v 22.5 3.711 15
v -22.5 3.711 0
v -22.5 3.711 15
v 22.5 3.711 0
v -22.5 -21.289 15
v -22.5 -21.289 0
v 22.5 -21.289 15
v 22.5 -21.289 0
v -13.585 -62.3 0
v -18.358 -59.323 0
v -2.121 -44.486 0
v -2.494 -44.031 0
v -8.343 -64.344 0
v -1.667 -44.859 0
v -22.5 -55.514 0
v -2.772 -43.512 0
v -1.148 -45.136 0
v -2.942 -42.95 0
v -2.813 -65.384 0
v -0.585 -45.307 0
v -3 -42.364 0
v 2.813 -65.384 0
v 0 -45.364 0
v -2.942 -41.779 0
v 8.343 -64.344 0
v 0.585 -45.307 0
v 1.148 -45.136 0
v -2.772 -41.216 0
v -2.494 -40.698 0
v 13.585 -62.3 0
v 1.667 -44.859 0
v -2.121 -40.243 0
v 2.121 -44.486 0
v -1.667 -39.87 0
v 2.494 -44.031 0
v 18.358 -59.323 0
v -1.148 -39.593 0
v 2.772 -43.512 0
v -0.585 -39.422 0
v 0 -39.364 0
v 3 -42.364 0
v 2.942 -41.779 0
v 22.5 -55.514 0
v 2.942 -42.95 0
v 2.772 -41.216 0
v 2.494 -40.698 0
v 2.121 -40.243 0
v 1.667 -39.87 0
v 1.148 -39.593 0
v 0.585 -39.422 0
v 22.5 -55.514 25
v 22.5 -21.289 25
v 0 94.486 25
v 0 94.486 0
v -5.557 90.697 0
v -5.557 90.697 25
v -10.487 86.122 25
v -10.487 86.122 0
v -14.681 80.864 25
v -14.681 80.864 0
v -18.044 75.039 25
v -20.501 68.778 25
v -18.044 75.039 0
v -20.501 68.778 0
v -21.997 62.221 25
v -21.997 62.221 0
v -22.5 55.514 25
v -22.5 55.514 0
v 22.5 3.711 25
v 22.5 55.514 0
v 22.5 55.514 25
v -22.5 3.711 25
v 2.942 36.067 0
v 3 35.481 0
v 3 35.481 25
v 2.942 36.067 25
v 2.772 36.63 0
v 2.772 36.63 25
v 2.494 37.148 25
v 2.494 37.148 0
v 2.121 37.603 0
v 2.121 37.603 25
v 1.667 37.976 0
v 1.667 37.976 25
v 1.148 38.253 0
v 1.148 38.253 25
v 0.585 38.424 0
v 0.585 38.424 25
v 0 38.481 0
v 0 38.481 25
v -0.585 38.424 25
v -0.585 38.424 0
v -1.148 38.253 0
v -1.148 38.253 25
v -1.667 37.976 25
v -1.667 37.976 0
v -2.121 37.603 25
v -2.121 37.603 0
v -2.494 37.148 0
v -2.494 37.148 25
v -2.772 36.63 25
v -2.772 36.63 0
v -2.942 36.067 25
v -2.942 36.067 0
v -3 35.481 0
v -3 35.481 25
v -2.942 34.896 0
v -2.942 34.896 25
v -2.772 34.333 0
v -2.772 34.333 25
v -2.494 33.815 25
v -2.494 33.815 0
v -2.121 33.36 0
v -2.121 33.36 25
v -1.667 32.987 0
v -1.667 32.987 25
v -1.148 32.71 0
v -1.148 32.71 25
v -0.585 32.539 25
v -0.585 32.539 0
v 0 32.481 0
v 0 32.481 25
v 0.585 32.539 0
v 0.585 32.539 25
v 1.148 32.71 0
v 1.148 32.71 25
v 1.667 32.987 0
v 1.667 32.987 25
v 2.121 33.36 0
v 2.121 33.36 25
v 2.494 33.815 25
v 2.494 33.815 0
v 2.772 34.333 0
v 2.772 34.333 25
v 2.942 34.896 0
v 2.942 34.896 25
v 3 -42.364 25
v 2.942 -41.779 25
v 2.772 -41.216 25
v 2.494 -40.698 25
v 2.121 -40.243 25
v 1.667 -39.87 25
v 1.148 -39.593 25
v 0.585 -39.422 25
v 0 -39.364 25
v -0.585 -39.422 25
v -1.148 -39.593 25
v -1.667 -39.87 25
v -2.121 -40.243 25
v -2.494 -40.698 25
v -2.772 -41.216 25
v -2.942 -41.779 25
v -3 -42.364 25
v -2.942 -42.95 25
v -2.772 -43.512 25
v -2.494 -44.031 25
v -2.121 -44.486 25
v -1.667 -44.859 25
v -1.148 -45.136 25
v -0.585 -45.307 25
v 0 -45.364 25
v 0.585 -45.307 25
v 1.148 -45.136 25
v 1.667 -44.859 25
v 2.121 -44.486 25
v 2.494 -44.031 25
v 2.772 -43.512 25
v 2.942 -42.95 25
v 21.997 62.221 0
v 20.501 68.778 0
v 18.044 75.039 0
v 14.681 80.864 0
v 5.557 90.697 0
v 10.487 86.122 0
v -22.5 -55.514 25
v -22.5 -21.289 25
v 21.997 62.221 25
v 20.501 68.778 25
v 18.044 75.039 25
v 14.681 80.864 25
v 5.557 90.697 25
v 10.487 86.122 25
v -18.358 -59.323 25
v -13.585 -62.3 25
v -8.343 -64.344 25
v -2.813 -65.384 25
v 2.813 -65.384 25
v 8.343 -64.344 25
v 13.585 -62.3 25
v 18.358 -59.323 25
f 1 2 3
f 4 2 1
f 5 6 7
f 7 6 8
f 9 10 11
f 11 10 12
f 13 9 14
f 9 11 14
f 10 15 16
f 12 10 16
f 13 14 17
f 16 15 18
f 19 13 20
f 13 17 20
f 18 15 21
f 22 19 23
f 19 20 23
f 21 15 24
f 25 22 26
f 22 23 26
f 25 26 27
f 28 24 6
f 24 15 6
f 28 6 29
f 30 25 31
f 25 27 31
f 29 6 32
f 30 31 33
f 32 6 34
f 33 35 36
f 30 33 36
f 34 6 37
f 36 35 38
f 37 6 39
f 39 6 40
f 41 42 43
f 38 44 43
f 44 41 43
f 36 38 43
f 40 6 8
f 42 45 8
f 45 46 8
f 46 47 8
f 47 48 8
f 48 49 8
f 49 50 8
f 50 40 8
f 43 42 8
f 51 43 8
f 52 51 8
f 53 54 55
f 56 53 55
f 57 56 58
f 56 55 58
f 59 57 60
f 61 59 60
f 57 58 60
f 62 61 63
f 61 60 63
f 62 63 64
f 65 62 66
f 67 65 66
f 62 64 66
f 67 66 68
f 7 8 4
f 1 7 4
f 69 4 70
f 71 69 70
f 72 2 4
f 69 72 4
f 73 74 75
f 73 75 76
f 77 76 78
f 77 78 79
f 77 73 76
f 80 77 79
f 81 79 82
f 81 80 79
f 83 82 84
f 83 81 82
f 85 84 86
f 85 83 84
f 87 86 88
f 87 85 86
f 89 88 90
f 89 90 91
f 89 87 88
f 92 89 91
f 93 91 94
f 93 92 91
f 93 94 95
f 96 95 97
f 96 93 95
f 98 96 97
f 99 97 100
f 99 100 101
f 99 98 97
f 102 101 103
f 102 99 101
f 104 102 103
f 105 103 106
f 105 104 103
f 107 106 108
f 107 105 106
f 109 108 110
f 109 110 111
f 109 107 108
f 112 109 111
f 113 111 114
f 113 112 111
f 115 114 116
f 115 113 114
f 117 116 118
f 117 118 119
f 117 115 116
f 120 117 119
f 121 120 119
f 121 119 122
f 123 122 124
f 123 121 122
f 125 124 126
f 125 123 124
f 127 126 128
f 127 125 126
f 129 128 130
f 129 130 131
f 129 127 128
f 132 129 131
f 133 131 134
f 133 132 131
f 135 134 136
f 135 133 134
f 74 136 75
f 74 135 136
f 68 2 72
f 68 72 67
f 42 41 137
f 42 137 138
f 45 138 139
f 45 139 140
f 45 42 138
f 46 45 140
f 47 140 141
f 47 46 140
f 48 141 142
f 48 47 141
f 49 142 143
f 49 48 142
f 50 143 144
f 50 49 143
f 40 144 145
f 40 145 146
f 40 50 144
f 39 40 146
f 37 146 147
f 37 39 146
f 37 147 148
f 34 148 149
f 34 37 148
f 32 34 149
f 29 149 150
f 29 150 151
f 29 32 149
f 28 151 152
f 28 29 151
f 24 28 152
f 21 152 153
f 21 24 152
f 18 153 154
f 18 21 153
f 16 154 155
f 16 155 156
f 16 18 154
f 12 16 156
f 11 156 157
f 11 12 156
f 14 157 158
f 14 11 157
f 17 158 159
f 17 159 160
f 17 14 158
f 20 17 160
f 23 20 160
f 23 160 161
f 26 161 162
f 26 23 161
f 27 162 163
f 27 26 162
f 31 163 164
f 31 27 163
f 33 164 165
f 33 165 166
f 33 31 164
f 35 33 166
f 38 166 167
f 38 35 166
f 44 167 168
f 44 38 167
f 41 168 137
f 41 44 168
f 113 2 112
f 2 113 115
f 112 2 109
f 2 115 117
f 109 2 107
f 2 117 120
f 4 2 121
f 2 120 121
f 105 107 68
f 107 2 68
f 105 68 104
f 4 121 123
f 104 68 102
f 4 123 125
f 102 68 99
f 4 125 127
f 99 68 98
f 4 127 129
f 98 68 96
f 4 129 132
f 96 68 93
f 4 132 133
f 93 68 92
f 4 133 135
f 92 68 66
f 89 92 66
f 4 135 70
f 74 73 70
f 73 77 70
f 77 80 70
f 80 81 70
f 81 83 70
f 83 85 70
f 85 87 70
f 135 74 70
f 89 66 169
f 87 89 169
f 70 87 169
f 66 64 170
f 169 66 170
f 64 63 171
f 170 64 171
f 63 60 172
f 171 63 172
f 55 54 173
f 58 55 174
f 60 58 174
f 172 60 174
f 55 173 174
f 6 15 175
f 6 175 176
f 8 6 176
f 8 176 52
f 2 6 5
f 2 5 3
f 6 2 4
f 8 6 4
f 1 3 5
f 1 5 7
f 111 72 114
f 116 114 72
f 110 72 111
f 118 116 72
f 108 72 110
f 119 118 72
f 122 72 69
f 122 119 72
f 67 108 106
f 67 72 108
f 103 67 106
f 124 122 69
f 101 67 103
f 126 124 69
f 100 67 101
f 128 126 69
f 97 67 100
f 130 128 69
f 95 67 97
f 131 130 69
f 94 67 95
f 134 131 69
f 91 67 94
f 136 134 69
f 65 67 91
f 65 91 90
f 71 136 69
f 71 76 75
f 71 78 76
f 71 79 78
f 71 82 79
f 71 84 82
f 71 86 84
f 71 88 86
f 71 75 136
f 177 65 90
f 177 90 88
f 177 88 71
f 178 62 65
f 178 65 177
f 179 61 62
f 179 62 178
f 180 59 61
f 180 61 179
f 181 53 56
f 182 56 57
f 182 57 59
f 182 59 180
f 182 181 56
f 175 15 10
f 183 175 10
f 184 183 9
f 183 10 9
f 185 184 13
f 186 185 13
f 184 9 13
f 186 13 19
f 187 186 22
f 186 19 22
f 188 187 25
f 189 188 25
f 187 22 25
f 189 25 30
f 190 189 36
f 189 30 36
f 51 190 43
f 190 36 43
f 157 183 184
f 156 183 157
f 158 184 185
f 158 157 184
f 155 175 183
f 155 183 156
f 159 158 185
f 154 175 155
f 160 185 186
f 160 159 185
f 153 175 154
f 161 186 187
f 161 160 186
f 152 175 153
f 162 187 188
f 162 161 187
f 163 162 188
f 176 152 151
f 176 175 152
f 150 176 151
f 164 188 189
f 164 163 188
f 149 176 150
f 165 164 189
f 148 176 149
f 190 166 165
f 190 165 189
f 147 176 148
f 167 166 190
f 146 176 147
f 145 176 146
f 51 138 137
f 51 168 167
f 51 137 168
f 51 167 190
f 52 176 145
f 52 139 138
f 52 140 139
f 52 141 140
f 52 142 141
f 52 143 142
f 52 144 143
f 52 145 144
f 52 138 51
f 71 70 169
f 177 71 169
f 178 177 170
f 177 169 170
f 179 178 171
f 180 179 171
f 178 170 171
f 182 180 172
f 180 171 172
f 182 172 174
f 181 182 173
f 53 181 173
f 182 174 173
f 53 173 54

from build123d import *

# Parameters (mm, degrees)
F0_W     = 45
F0_H     = 51.803312
F0_R     = 3
F0_H_2   = 34.225544
F1_DEPTH = 25
F0_H_3   = 25
F2_DEPTH = 15


with BuildPart() as f1:
    # F0 (on Top) → F1 (new body)
    with BuildSketch(Plane.XY):
        with BuildLine():
            ThreePointArc((0, 94.485572), (-16.471143, 78.014428), (-22.5, 55.514428))
            Line((-22.5, 55.514428), (22.5, 55.514428))
            ThreePointArc((22.5, 55.514428), (16.471143, 78.014428), (0, 94.485572))
        make_face()
        with Locations((0, 29.612772)):
            Rectangle(F0_W, F0_H)
        with Locations((0, 35.48148)):
            Circle(F0_R, mode=Mode.SUBTRACT)
        with Locations((0, -38.401656)):
            Rectangle(F0_W, F0_H_2)
        with Locations((0, -42.364431)):
            Circle(F0_R, mode=Mode.SUBTRACT)
        with BuildLine():
            Line((22.5, -55.514428), (-22.5, -55.514428))
            ThreePointArc((-22.5, -55.514428), (0, -65.514428), (22.5, -55.514428))
        make_face()
    extrude(amount=F1_DEPTH)


with BuildPart() as f2:
    # F0 (on Top) → F2 (new body)
    with BuildSketch(Plane.XY):
        with Locations((0, -8.788884)):
            Rectangle(F0_W, F0_H_3)
    extrude(amount=F2_DEPTH)


solid = Compound([f1.part, f2.part])
